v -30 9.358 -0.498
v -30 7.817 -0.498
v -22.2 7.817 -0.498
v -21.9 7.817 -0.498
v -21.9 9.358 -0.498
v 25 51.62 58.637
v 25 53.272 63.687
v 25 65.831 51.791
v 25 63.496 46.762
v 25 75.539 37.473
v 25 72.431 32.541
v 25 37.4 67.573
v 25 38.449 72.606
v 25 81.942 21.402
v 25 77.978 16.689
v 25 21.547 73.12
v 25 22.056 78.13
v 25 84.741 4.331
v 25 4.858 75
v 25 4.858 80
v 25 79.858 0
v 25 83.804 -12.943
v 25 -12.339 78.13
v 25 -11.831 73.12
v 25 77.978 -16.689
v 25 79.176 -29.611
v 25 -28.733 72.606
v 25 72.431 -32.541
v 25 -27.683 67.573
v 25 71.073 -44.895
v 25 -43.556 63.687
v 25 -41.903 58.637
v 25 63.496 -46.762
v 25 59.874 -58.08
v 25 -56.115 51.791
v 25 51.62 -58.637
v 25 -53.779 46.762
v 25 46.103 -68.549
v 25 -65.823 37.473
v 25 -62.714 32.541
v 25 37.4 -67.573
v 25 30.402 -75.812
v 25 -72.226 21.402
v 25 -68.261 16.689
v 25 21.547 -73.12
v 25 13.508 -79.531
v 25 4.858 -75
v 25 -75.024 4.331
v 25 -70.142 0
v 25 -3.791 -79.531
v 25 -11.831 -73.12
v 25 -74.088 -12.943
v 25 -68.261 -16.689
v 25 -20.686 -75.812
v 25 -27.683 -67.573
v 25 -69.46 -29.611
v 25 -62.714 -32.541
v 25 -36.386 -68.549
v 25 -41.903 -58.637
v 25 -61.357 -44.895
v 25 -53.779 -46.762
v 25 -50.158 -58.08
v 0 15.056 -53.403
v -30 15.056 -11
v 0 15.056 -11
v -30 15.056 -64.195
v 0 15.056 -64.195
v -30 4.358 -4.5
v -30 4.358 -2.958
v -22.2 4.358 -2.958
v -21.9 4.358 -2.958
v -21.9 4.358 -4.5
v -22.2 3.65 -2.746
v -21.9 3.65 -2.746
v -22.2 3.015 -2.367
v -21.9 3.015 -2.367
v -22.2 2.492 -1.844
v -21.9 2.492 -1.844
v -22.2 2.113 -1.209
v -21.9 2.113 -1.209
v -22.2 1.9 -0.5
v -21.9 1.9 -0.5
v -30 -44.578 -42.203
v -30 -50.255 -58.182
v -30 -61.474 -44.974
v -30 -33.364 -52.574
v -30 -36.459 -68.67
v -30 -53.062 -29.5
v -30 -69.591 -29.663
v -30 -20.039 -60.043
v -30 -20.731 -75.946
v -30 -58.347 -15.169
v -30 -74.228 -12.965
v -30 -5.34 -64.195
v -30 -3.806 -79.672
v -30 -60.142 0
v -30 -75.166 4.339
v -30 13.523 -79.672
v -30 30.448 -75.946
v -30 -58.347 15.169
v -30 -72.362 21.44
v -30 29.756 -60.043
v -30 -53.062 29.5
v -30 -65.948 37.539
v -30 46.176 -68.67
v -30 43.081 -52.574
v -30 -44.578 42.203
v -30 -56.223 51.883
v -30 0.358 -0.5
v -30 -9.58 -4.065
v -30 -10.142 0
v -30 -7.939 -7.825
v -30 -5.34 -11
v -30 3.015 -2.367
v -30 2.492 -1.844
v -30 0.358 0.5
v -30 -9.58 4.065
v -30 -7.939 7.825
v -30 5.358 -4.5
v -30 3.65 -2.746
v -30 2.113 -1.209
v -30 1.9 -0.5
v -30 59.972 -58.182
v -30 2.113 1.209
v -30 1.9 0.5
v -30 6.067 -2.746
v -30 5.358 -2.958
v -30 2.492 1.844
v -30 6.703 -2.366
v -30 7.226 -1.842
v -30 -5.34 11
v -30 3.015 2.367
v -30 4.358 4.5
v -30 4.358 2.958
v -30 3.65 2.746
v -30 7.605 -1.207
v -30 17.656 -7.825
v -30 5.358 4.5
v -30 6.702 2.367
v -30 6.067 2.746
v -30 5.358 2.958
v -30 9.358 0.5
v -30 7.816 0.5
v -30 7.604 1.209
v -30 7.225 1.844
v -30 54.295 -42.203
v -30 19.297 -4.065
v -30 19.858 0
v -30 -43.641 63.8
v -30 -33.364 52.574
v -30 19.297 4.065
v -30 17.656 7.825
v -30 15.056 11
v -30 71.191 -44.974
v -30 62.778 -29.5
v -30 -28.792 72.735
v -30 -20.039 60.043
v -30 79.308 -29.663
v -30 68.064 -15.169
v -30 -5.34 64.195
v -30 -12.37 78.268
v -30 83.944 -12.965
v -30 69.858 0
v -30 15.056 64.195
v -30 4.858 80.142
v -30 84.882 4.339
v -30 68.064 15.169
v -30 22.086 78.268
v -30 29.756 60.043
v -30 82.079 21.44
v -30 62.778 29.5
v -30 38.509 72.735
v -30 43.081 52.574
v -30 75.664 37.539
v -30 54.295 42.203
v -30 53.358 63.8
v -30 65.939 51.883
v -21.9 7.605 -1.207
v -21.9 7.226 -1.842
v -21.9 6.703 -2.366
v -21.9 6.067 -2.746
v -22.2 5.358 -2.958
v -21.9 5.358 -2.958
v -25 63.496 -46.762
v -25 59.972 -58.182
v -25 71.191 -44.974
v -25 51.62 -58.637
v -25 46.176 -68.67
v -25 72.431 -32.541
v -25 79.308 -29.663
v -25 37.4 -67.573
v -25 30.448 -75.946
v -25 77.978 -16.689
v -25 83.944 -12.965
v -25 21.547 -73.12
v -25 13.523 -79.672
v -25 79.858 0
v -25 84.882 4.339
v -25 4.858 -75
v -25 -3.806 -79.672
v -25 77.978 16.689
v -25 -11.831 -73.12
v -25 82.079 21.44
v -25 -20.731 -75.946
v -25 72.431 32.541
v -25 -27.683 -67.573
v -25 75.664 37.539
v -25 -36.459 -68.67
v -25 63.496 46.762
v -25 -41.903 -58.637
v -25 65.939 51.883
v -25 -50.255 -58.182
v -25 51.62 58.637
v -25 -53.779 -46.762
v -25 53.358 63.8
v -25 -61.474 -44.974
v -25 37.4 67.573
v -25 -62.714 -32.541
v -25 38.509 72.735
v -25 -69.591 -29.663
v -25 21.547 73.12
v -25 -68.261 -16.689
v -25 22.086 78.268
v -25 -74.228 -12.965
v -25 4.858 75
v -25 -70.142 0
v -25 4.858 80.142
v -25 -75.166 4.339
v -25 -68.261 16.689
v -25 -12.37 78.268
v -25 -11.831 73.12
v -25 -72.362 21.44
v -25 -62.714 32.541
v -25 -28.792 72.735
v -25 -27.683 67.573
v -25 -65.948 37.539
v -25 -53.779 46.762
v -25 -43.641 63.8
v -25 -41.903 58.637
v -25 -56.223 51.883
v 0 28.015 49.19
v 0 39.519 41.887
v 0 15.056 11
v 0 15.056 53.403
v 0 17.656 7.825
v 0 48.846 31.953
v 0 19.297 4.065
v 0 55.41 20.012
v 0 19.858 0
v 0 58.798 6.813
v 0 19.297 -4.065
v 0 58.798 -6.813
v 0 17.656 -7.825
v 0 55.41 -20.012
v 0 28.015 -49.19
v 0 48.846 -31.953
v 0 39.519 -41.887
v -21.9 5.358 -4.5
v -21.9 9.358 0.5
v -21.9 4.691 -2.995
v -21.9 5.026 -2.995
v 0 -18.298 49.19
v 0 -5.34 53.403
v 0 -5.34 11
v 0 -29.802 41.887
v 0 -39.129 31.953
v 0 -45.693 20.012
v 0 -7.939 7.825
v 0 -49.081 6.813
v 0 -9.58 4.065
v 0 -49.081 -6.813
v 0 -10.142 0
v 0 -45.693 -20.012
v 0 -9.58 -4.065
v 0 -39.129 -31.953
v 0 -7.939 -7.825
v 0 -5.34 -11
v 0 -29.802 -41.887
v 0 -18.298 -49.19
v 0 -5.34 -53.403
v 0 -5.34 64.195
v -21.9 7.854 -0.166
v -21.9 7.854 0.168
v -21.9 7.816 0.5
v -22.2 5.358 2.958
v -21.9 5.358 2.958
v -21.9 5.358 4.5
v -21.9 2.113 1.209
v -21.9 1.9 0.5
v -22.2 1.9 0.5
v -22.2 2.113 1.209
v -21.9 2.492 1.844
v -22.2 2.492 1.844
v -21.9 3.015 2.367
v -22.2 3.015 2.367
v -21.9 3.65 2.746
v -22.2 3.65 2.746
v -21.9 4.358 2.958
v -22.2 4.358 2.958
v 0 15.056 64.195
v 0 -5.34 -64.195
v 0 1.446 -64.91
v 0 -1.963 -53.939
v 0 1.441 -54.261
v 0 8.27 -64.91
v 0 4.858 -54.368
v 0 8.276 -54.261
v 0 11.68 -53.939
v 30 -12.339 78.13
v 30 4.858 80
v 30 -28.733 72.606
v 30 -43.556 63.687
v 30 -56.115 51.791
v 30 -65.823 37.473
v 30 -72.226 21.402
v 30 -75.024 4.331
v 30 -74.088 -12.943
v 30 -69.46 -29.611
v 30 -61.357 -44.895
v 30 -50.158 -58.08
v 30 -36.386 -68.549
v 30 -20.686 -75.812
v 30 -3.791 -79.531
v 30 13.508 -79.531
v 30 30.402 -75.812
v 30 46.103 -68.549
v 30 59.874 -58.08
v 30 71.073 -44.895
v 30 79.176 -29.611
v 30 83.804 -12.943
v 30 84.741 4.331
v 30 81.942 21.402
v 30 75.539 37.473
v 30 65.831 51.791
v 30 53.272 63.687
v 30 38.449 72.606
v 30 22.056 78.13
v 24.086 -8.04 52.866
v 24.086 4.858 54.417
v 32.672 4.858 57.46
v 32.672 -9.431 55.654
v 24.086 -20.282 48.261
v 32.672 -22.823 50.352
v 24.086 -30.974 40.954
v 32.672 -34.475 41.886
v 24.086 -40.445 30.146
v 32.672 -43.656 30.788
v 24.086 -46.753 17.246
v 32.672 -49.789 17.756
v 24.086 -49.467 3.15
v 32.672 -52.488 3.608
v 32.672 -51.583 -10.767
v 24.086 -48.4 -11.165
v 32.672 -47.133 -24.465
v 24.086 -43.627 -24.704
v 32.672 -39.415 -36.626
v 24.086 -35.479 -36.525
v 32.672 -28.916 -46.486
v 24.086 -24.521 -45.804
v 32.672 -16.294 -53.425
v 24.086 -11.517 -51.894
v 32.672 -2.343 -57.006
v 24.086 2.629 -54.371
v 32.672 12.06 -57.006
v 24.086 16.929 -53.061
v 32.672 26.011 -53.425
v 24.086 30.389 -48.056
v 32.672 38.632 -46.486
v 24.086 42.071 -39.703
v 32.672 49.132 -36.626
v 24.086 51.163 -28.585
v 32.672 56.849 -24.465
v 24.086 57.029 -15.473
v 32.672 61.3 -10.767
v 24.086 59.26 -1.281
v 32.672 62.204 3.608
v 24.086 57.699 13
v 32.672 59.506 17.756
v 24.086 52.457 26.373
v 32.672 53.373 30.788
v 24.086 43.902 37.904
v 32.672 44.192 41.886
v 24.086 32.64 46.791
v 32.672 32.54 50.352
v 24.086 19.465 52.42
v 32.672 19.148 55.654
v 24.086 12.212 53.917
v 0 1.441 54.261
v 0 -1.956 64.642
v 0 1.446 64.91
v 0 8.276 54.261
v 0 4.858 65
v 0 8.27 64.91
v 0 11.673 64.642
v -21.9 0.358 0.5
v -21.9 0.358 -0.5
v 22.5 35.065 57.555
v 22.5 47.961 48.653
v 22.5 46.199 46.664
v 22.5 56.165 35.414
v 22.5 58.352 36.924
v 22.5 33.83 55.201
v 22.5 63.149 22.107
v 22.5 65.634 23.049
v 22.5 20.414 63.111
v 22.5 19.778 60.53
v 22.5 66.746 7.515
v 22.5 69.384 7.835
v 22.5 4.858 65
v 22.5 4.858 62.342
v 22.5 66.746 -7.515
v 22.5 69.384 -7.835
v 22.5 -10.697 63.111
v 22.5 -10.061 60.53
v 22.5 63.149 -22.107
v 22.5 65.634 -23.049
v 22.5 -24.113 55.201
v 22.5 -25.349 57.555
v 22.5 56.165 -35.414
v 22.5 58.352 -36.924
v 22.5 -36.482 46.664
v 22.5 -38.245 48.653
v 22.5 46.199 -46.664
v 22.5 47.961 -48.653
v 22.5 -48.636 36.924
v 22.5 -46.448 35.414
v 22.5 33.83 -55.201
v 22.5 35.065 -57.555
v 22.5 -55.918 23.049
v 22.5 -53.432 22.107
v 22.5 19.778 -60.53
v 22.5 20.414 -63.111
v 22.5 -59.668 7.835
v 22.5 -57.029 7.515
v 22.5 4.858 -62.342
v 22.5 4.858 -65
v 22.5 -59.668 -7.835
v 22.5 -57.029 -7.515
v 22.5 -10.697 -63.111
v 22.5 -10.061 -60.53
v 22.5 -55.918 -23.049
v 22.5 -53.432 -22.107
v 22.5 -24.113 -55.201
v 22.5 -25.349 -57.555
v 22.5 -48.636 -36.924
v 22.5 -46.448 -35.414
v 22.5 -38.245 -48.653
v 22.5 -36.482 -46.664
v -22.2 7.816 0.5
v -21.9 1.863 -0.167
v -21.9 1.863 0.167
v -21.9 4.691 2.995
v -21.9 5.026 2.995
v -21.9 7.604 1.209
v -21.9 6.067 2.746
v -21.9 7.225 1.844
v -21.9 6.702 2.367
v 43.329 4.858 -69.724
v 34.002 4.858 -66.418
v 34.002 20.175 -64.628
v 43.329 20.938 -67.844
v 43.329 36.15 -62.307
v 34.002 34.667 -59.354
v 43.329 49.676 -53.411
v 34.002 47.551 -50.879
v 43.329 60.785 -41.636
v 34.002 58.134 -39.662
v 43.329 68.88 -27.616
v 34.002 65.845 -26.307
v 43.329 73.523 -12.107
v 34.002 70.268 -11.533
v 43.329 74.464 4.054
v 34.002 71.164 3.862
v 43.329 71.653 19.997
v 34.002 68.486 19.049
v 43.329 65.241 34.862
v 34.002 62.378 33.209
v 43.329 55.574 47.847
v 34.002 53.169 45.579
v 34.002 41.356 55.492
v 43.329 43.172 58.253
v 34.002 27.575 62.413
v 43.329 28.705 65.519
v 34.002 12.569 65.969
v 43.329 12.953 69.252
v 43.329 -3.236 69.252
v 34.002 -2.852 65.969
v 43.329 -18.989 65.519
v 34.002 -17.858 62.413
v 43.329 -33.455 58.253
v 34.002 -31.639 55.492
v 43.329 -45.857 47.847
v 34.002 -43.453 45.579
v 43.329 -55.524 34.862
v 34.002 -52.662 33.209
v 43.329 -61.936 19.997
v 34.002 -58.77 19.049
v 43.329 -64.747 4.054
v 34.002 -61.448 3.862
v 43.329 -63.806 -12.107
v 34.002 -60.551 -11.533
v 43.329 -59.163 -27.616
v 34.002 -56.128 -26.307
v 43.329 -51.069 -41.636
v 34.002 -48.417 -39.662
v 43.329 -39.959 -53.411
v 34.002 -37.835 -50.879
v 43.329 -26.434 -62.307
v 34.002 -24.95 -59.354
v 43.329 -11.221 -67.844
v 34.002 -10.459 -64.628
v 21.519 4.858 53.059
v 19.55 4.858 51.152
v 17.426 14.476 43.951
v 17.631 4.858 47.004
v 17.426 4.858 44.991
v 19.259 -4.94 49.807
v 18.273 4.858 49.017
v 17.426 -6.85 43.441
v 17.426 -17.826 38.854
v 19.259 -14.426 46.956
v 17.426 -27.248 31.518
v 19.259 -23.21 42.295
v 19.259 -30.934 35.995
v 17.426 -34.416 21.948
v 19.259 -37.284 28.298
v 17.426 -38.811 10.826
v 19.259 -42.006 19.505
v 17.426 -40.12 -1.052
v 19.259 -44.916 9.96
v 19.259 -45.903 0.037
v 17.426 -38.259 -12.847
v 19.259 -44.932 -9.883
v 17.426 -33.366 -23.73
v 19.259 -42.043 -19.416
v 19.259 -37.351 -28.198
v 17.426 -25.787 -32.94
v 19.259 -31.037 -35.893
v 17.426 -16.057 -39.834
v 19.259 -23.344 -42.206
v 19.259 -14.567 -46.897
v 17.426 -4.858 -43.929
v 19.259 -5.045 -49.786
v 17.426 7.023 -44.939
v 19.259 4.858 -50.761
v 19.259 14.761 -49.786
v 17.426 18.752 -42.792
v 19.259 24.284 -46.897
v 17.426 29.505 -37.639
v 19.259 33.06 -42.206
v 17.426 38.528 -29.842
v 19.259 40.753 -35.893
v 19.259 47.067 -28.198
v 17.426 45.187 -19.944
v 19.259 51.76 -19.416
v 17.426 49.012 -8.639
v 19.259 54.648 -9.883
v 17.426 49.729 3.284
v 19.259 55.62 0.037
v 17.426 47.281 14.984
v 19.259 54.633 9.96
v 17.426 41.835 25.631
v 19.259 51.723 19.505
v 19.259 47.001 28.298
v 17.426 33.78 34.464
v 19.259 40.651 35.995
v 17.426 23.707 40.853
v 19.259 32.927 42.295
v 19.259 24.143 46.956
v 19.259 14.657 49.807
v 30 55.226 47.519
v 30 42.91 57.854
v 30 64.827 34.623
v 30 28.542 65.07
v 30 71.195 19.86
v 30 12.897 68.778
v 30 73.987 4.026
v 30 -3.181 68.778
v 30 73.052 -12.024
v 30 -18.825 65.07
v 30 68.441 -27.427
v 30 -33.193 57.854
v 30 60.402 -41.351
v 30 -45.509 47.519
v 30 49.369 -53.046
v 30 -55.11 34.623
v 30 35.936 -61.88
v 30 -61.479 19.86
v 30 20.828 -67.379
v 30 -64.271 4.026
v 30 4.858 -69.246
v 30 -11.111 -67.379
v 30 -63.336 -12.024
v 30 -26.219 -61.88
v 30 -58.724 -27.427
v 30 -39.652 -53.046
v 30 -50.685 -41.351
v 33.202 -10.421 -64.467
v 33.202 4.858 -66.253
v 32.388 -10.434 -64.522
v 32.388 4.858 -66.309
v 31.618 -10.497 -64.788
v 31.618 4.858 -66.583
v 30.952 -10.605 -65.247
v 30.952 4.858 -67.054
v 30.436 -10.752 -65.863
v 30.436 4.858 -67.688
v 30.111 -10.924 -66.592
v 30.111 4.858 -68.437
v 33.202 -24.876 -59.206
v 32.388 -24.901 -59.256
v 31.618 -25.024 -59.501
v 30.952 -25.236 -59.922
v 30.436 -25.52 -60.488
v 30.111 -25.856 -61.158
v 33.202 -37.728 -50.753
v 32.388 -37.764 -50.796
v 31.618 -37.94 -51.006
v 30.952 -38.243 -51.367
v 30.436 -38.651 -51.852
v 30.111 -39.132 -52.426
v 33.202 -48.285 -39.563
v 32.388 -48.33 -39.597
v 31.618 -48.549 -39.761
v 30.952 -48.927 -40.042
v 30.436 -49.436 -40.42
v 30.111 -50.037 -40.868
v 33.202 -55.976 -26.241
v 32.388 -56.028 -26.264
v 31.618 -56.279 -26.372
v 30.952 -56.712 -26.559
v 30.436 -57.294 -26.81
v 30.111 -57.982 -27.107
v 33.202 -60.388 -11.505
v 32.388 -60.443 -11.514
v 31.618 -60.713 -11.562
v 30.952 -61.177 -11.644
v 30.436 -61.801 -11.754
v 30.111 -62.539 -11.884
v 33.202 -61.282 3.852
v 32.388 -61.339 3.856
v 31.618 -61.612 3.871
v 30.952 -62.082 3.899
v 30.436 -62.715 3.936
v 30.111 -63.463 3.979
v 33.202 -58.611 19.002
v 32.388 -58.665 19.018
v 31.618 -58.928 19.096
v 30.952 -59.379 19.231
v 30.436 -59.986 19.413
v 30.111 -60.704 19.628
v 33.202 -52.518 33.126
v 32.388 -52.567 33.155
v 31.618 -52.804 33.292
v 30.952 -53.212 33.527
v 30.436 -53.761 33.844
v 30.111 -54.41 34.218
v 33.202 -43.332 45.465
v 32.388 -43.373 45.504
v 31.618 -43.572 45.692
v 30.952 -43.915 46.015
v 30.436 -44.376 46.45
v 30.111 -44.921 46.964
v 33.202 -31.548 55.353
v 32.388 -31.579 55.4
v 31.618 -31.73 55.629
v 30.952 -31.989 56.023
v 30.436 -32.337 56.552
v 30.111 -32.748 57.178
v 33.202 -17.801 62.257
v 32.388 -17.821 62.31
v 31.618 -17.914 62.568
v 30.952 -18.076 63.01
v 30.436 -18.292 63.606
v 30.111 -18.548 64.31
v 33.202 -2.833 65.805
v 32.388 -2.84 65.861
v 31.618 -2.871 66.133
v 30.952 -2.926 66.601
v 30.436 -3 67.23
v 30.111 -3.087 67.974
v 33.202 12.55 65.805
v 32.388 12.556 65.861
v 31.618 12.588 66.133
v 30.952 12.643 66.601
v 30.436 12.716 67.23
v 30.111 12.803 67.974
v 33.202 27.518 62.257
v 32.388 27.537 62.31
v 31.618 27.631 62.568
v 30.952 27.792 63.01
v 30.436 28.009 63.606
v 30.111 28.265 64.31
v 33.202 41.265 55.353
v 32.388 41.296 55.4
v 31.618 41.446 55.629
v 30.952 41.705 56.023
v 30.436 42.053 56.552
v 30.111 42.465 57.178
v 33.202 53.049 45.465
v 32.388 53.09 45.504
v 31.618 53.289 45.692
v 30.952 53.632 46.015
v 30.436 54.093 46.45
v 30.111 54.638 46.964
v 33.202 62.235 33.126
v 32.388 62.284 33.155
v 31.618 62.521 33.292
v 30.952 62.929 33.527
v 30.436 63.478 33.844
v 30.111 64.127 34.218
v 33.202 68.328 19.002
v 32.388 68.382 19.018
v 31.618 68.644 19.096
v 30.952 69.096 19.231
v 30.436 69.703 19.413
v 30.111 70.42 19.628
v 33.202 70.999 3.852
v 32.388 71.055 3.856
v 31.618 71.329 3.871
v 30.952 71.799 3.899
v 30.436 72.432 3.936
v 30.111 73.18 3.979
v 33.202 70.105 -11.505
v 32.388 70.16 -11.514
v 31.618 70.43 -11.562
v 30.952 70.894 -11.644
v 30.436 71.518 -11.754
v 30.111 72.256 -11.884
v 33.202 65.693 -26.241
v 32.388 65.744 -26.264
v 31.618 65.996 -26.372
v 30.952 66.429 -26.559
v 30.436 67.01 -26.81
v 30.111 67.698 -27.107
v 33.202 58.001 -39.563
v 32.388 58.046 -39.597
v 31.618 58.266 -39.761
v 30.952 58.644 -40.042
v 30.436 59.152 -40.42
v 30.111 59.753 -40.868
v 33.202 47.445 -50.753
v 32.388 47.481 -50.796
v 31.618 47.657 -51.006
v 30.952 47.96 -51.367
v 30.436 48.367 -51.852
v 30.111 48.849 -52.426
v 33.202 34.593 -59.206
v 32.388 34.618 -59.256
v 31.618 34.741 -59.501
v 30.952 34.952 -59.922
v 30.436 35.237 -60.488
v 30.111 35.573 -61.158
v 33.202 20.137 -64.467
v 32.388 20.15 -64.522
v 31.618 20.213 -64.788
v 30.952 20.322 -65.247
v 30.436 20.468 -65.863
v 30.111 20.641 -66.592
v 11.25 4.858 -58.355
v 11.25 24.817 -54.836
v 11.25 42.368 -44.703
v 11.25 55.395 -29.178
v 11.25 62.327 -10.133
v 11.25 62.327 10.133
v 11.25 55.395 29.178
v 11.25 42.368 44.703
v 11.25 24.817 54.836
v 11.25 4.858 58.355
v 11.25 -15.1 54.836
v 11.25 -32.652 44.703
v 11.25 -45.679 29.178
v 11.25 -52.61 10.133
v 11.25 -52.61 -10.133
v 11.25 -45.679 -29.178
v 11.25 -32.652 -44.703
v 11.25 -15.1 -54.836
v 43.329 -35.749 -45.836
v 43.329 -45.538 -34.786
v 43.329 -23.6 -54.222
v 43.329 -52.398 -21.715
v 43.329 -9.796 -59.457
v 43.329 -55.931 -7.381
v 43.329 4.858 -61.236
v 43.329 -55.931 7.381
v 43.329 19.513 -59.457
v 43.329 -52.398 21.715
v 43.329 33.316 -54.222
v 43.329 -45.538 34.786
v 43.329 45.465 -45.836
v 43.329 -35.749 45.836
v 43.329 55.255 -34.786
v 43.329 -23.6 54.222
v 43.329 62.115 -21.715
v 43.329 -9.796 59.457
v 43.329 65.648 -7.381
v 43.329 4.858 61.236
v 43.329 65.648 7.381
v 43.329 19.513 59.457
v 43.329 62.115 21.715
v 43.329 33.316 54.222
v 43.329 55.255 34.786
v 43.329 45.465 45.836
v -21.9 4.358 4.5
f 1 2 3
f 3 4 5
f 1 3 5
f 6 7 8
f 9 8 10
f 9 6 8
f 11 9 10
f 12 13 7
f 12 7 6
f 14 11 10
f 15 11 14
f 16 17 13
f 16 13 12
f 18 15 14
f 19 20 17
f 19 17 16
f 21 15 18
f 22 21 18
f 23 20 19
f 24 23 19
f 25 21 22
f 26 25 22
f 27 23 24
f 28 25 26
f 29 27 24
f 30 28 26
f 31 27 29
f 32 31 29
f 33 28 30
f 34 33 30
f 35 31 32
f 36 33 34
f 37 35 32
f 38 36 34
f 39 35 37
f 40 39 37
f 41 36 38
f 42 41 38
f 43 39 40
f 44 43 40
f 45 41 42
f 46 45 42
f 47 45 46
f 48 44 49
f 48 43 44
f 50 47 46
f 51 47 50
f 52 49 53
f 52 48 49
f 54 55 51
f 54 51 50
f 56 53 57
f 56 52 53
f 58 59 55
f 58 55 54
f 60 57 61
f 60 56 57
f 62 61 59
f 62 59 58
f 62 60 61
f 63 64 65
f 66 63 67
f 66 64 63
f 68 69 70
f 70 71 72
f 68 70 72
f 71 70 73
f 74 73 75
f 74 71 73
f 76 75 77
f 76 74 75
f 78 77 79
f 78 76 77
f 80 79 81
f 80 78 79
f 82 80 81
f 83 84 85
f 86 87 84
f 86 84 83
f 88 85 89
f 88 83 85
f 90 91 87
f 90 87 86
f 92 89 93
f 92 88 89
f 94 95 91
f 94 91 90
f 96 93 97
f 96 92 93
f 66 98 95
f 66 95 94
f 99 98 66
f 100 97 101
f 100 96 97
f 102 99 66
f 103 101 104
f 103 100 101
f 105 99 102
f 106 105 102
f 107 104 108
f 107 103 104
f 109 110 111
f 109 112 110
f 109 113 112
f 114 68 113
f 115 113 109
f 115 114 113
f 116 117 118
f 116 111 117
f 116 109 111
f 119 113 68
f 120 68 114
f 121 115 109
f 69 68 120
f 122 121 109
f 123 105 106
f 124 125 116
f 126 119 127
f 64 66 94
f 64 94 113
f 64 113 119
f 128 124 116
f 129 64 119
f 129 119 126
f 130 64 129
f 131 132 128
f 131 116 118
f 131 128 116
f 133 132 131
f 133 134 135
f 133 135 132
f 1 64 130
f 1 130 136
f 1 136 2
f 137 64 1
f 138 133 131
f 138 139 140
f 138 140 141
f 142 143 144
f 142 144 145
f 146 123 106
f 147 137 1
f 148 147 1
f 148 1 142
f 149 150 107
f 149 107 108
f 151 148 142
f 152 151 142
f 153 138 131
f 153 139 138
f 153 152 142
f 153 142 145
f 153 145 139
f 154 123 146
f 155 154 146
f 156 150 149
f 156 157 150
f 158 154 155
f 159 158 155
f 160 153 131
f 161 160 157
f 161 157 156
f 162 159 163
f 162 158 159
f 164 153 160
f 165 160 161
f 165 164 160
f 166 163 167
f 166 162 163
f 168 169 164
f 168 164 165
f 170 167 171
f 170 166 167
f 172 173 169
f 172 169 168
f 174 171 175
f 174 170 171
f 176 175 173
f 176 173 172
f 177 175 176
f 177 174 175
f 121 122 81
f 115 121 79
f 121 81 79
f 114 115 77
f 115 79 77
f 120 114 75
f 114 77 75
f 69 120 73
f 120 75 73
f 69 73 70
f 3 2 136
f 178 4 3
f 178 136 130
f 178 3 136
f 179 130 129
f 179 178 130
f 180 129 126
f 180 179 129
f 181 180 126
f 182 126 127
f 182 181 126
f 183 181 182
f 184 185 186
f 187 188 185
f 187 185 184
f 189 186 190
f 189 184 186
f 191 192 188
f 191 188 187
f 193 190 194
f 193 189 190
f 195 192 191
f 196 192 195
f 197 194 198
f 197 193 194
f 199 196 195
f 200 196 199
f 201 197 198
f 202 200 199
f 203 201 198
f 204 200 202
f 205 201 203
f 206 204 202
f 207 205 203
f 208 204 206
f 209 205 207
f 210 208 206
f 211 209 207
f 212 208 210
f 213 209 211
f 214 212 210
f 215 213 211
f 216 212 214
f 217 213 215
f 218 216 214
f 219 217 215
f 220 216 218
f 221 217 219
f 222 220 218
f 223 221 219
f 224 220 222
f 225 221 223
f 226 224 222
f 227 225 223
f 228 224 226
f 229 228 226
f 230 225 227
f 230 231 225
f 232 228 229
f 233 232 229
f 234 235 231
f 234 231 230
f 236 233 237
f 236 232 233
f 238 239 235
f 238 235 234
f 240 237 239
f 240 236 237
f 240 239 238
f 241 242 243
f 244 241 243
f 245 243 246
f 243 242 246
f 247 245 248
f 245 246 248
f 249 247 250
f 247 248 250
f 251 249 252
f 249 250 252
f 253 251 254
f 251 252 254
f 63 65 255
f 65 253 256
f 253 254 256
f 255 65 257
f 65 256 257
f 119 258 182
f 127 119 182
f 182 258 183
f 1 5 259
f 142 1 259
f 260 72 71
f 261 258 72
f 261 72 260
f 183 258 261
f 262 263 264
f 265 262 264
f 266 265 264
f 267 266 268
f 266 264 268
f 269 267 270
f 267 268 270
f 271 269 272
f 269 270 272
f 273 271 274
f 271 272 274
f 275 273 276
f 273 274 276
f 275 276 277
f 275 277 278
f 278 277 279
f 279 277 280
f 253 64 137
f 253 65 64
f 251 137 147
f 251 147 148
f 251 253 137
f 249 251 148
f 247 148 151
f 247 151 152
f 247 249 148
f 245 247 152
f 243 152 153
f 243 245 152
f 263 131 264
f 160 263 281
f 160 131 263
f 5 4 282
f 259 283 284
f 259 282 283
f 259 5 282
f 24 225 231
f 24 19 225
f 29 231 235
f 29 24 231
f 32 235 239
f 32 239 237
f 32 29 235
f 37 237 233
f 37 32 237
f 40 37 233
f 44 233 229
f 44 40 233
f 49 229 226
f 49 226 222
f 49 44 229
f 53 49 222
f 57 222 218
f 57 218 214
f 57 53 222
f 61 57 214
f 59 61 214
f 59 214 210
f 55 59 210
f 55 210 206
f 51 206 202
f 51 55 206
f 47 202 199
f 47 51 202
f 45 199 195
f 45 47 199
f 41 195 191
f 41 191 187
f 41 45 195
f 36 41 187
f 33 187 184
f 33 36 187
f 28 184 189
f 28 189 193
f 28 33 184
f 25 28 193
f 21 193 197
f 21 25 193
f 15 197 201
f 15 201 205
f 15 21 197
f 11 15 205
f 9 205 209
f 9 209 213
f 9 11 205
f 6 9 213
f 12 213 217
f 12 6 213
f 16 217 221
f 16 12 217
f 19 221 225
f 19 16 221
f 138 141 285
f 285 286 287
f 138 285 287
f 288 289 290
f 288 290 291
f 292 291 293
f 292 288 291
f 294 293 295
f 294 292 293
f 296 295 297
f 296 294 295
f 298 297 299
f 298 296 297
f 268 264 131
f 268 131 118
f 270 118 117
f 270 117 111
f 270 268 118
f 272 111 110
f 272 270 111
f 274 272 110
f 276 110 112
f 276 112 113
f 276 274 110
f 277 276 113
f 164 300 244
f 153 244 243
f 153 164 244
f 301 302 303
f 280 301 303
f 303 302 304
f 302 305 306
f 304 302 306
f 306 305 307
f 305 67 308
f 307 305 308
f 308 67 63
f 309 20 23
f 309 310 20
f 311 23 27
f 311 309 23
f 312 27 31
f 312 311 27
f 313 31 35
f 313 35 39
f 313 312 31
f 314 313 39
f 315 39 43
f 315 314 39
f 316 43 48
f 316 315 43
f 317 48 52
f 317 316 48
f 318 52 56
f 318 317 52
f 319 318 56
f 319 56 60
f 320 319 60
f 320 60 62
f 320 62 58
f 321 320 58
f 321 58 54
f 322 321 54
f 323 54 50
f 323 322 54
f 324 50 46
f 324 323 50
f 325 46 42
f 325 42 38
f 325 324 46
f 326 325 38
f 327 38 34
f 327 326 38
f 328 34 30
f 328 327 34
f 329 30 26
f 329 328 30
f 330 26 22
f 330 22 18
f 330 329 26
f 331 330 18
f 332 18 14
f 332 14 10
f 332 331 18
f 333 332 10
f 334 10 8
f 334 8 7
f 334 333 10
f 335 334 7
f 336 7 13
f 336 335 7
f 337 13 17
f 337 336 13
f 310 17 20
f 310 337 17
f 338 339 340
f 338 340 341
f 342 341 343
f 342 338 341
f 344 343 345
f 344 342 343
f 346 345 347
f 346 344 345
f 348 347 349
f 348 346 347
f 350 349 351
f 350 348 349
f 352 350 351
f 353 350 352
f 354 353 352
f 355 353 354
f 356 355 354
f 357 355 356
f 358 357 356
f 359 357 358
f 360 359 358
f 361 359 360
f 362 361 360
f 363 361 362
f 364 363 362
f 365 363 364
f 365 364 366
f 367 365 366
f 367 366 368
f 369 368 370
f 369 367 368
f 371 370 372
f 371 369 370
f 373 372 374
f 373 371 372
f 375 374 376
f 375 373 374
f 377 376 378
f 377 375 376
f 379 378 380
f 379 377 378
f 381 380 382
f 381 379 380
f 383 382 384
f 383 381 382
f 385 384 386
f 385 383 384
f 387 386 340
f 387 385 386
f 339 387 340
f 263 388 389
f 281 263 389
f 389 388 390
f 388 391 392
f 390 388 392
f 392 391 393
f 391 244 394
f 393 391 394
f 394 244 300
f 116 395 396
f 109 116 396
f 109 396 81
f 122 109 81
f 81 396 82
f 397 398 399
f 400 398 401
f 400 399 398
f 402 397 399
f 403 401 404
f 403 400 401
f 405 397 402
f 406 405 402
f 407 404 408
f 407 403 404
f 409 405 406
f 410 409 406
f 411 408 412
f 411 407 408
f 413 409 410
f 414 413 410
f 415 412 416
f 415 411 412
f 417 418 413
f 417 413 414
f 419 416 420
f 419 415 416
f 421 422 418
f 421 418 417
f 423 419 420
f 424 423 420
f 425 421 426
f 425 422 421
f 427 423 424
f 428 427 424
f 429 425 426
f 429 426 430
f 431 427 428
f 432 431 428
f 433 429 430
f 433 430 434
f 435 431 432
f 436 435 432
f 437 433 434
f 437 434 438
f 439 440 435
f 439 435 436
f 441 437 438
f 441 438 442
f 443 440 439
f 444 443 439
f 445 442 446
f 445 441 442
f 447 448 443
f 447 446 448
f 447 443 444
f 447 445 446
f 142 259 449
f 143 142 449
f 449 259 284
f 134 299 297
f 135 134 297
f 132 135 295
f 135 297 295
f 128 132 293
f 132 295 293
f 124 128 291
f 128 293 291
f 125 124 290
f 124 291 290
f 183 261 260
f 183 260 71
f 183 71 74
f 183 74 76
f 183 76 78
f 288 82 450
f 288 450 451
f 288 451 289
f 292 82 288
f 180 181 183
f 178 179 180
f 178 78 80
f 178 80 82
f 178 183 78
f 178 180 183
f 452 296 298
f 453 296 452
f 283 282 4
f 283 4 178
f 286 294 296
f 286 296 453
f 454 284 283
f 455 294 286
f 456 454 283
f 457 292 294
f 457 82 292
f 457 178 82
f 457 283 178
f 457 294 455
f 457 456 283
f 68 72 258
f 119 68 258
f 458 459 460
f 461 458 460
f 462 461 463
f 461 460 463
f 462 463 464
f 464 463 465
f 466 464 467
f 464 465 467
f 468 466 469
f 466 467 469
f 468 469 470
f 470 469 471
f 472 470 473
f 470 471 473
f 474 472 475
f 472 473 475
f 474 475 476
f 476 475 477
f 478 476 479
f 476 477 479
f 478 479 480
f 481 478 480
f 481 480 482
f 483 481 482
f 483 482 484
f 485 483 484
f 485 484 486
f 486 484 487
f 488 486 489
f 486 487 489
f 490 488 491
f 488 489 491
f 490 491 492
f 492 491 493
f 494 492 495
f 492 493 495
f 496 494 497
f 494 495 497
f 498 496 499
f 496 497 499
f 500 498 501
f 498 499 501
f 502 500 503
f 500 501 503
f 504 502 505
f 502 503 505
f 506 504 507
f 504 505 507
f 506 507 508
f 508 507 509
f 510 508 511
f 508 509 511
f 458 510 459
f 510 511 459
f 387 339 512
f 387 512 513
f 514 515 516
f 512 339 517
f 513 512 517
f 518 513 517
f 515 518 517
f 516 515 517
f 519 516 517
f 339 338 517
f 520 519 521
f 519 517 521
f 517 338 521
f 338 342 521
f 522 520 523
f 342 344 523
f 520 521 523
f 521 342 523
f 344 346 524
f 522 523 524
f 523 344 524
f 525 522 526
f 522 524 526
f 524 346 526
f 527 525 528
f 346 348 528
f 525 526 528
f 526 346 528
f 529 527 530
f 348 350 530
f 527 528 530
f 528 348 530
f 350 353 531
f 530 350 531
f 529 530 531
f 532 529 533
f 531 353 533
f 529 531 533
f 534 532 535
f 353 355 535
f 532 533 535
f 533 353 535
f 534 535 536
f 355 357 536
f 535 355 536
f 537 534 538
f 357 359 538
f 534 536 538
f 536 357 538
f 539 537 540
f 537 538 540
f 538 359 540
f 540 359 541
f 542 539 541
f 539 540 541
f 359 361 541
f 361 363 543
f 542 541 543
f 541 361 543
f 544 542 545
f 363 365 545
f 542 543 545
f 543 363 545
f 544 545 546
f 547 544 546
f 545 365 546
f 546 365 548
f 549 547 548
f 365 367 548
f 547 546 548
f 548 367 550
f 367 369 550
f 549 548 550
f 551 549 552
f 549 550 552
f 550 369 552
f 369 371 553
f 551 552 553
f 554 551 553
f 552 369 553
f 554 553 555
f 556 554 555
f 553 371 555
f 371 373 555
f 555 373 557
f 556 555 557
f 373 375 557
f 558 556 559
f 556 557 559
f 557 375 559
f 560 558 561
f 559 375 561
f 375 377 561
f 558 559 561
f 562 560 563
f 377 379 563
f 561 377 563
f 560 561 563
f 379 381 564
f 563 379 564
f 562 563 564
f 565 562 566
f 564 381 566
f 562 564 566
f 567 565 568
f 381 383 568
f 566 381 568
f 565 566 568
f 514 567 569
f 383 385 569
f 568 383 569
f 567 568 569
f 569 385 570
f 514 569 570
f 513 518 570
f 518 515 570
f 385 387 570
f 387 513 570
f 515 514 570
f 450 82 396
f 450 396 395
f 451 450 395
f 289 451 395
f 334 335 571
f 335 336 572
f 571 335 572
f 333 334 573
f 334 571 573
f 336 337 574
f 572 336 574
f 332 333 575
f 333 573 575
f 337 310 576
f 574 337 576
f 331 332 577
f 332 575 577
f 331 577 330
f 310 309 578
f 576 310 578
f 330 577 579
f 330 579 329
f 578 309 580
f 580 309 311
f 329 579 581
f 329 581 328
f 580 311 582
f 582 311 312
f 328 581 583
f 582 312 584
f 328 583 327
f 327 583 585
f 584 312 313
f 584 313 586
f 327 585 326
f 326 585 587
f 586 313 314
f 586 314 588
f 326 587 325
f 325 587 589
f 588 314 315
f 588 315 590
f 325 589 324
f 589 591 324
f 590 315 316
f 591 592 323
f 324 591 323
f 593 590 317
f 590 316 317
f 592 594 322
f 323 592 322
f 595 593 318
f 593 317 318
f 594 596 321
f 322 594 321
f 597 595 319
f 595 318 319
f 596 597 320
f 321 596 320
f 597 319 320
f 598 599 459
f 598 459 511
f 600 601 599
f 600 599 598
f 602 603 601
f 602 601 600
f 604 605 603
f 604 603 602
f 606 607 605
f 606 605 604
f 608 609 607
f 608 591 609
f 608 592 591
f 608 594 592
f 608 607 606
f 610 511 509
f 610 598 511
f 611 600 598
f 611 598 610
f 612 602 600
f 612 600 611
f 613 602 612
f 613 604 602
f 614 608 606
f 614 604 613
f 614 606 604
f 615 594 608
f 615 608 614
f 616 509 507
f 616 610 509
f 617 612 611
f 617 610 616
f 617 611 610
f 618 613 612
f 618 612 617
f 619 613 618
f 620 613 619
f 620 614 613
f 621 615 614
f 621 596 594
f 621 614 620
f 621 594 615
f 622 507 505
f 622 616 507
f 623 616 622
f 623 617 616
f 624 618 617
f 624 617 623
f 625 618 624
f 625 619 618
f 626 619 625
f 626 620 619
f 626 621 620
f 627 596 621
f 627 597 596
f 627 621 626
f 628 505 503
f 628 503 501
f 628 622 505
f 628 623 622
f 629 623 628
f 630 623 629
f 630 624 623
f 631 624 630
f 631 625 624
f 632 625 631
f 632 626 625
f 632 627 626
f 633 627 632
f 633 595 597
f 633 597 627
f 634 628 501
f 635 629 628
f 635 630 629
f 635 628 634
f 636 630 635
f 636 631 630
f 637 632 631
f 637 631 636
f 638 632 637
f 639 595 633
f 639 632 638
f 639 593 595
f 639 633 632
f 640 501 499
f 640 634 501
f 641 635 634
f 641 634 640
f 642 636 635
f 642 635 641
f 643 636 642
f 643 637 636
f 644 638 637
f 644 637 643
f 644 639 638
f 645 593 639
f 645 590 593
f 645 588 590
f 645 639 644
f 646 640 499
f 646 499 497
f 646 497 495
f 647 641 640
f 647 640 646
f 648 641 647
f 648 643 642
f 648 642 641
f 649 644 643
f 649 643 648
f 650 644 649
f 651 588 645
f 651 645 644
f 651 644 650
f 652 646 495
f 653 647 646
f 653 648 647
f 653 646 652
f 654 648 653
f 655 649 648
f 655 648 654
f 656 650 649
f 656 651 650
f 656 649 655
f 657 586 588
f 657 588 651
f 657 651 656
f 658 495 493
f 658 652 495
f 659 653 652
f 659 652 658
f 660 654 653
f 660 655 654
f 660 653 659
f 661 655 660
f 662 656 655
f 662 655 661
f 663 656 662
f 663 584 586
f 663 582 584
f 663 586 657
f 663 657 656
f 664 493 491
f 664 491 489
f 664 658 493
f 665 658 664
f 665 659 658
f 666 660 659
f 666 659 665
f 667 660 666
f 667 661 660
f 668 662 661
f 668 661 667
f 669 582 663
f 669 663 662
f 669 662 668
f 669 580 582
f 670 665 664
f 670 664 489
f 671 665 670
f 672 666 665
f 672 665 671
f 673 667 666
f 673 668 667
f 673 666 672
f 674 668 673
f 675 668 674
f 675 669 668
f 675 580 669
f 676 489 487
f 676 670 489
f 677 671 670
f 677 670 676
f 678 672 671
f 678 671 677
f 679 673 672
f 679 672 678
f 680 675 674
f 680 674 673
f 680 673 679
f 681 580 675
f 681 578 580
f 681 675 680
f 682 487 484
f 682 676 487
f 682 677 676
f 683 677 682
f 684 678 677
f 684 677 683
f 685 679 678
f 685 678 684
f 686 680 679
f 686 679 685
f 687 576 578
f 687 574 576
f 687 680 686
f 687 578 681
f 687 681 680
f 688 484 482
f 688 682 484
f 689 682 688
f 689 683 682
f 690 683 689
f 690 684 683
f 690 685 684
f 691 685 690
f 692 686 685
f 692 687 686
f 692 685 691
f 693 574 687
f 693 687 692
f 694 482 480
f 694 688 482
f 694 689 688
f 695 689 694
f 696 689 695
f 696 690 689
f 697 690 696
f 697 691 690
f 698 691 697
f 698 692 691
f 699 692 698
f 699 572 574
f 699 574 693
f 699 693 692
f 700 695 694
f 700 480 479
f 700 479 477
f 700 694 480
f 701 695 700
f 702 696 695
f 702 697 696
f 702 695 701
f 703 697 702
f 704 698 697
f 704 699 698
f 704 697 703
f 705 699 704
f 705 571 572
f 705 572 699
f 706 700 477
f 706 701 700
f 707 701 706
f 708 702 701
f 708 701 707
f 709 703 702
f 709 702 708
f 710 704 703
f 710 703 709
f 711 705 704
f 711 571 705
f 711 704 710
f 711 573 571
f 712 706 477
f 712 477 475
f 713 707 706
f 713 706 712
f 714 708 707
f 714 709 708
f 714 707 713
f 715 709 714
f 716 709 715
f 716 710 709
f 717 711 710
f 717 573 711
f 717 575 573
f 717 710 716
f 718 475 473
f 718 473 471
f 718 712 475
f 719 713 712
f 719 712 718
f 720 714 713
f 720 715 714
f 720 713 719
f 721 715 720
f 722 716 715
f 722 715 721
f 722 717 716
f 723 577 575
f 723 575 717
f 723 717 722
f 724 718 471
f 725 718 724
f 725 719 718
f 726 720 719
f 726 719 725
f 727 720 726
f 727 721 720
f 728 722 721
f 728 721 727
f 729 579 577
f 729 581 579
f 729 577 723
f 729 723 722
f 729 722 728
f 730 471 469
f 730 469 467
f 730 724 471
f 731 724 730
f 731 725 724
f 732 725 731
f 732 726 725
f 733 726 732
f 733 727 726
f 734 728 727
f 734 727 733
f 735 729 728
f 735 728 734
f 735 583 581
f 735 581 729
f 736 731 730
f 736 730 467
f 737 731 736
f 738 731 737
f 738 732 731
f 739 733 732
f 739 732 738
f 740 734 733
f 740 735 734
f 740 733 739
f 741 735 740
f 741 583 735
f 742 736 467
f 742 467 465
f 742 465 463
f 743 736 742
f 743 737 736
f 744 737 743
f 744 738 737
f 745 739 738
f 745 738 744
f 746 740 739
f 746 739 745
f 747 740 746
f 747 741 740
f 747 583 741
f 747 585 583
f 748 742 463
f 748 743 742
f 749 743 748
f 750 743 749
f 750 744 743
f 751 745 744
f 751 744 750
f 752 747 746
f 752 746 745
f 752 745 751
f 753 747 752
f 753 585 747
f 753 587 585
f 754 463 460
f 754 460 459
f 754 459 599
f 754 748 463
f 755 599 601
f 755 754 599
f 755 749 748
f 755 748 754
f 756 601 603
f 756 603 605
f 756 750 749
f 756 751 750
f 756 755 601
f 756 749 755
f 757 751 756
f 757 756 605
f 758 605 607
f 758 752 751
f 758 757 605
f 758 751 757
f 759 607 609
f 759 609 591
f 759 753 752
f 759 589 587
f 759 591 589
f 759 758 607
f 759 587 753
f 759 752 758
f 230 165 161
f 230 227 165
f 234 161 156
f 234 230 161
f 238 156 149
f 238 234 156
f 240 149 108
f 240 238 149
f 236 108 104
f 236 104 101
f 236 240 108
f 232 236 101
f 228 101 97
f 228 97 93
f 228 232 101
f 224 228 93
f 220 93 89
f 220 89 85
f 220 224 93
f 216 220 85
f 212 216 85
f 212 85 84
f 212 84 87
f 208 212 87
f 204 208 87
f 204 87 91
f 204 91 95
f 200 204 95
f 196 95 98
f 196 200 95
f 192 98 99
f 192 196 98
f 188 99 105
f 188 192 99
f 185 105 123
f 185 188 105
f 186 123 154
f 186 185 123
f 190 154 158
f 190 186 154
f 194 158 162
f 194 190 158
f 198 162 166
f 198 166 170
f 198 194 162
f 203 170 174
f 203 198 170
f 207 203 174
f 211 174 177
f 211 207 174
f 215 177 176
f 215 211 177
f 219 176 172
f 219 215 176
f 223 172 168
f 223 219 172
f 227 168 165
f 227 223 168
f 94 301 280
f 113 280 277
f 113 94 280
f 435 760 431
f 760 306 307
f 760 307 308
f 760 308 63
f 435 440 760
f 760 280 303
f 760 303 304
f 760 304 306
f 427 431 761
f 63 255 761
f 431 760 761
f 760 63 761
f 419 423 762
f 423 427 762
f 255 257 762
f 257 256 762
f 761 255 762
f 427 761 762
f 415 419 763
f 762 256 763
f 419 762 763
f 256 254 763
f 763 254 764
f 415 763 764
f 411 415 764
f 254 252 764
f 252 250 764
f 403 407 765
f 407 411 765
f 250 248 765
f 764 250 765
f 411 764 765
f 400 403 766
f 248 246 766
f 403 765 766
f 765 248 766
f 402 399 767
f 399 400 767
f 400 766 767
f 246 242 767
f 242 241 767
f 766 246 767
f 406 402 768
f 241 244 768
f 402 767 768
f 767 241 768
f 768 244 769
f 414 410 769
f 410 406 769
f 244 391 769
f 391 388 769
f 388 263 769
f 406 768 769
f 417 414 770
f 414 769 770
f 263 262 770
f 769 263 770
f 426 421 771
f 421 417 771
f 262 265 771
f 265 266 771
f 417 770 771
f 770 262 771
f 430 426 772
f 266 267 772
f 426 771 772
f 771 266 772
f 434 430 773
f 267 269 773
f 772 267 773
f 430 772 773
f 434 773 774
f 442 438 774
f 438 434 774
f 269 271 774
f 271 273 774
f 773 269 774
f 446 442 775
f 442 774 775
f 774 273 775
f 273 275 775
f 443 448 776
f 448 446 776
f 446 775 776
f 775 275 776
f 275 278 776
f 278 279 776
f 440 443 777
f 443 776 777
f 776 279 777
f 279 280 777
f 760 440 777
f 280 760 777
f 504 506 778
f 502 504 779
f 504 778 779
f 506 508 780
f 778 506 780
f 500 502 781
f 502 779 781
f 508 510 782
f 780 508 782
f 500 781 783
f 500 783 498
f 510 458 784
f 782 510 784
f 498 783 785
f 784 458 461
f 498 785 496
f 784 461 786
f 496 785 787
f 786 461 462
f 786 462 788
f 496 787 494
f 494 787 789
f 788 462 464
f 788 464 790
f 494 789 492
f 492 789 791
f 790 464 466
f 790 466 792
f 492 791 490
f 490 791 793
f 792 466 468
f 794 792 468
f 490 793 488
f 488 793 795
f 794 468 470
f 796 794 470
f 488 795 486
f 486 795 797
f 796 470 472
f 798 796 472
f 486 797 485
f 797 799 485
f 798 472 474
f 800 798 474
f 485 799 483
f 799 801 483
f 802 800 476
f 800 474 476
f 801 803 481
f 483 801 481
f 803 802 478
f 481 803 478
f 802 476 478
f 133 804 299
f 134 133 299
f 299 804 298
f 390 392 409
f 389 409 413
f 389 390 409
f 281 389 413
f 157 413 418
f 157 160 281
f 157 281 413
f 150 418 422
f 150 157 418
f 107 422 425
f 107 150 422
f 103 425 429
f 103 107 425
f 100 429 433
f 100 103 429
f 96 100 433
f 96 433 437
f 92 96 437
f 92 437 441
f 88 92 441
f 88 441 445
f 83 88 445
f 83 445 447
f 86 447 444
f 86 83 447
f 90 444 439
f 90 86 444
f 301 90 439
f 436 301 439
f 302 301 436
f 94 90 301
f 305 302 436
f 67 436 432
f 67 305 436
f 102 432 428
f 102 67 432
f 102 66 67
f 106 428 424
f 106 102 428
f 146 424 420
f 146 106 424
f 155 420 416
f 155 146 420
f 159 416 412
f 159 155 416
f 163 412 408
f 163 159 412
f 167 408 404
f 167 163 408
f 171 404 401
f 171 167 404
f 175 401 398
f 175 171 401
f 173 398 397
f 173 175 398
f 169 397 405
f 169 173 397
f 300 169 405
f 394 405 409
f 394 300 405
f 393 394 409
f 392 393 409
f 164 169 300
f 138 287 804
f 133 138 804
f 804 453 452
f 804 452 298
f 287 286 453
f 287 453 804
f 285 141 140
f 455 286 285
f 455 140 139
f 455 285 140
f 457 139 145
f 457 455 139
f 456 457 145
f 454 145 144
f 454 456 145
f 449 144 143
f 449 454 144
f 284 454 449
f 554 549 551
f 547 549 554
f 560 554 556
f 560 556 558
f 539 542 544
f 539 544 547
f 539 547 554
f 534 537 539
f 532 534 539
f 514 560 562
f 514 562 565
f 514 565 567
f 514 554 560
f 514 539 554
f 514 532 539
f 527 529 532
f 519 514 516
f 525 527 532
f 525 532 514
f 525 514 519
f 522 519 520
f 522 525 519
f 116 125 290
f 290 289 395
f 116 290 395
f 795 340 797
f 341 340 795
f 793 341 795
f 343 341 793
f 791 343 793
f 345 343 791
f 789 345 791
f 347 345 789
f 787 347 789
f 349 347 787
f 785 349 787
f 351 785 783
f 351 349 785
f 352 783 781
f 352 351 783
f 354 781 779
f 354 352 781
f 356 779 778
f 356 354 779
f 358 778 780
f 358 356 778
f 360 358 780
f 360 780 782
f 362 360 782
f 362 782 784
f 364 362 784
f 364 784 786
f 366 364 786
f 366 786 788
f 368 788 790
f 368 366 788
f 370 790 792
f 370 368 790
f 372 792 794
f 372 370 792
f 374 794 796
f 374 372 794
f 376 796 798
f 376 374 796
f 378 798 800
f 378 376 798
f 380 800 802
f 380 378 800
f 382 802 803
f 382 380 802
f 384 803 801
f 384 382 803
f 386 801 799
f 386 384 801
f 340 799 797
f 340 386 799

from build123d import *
from build123d.topology import SkipClean

# Parameters (mm, degrees)
ESBO_O2_R                = 15
RESSALTO_EXTRUS_O1_DEPTH = 30
FILETE1_R                = 10
FILETE5_R                = 3
RESSALTO_EXTRUS_O3_DEPTH = 30
RESSALTO_EXTRUS_O4_START = -30
ESBO_O9_R                = 3
RESSALTO_EXTRUS_O4_DEPTH = 30
ESBO_O10_R               = 3
RESSALTO_EXTRUS_O5_DEPTH = 2
CORTE_EXTRUS_O1_START    = -0.3
ESBO_O14_R               = 3
CORTE_EXTRUS_O1_DEPTH    = 0.3
RESSALTO_EXTRUS_O6_START = -27
RESSALTO_EXTRUS_O6_DEPTH = 27


with BuildPart() as part:
    # Esboço1 → Revolução2 (revolve)
    with BuildSketch(Plane.XY, mode=Mode.PRIVATE) as revolu_o2_sk:
        Polygon((30, 69.858349347), (30, 4.858349347), (0, 4.858349347), (0, 19.858349347), (22.5, 19.858349347), (22.5, 69.858349347), (-30, 69.858349347), (-30, 85), (-25, 85), (-25, 79.858349347), (25, 79.858349347), (25, 84.858349347), (30, 84.858349347), align=None)
    revolve(revolu_o2_sk.sketch.rotate(Axis((-56.599013794, 4.858349347, 0), (1, 0, 0)), 90), axis=Axis((-56.599013794, 4.858349347, 0), (1, 0, 0)))

    # Esboço2 → Ressalto-extrusão1 (add)
    with BuildSketch(Plane(origin=(0, 0, 0), x_dir=(0, 0, -1), z_dir=(1, 0, 0))):
        with Locations(Location((0, 4.858349347, 0), (0, 0, 180))):
            Circle(ESBO_O2_R)
        with BuildLine():
            Line((-2.958039892, 5.358349347), (-4.5, 5.358349347))
            Line((-4.5, 5.358349347), (-4.5, 4.358349347))
            Line((-4.5, 4.358349347), (-2.958039892, 4.358349347))
            ThreePointArc((-2.958039892, 4.358349347), (-2.121320344, 2.737029004), (-0.5, 1.900309456))
            Line((-0.5, 1.900309456), (-0.5, 0.358349347))
            Line((-0.5, 0.358349347), (0.5, 0.358349347))
            Line((0.5, 0.358349347), (0.5, 1.900309456))
            ThreePointArc((0.5, 1.900309456), (2.121320344, 2.737029004), (2.958039892, 4.358349347))
            Line((2.958039892, 4.358349347), (4.5, 4.358349347))
            Line((4.5, 4.358349347), (4.5, 5.358349347))
            Line((4.5, 5.358349347), (2.958039892, 5.358349347))
            ThreePointArc((2.958039892, 5.358349347), (2.120440089, 6.98054958), (0.497545425, 7.81680309))
            Line((0.497545425, 7.81680309), (0.497545425, 9.358349347))
            Line((0.497545425, 9.358349347), (-0.5, 9.358349347))
            Line((-0.5, 9.358349347), (-0.5, 7.816389239))
            ThreePointArc((-0.5, 7.816389239), (-2.121320344, 6.979669691), (-2.958039892, 5.358349347))
        make_face(mode=Mode.SUBTRACT)
    extrude(amount=-RESSALTO_EXTRUS_O1_DEPTH)

    # Esboço4 → Revolução3 (revolve)
    with BuildSketch(Plane.XY, mode=Mode.PRIVATE) as revolu_o3_sk:
        Polygon((0, 59.226522002), (0, 4.858349347), (43.32899264, 4.858349347), (43.32899264, 74.582067629), align=None)
    revolve(revolu_o3_sk.sketch.rotate(Axis((-90.113441675, 4.858349347, 0), (1, 0, 0)), 270), axis=Axis((-90.113441675, 4.858349347, 0), (1, 0, 0)))

    # Esboço5 → Corte-Revolução3 (revolve, cut)
    with BuildSketch(Plane.XY, mode=Mode.PRIVATE) as corte_revolu_o3_sk:
        Polygon((43.32899264, 4.858349347), (43.32899264, 66.094541607), (32.672301871, 62.317871729), (22.015611102, 58.541201852), (17.426446921, 56.914828477), (17.426446921, 4.858349347), align=None)
    revolve(corte_revolu_o3_sk.sketch.rotate(Axis((17.426446921, 4.858349347, 0), (1, 0, 0)), 90), axis=Axis((17.426446921, 4.858349347, 0), (1, 0, 0)), mode=Mode.SUBTRACT)

    # Filete1
    filete1_edges = [part.edges().sort_by_distance(p)[0] for p in [
        (17.426446921, 4.858349347, -52.05647913),
    ]]
    fillet(filete1_edges, radius=FILETE1_R)

    # Filete5
    filete5_edges = [part.edges().sort_by_distance(p)[0] for p in [
        (30, 4.858349347, 65),
    ]]
    fillet(filete5_edges, radius=FILETE5_R)

    # Esboço7 → Ressalto-extrusão3 (add)
    with BuildSketch(Plane.ZY.offset(30)):
        with BuildLine():
            Line((-11, 15.056388374), (-64.195015383, 15.056388374))
            ThreePointArc((-64.195015383, 15.056388374), (-65, 4.858349347), (-64.195015383, -5.33968968))
            Line((-64.195015383, -5.33968968), (-11, -5.33968968))
            ThreePointArc((-11, -5.33968968), (-15, 4.858349347), (-11, 15.056388374))
        make_face()
        with BuildLine():
            Line((11, -5.33968968), (64.195015383, -5.33968968))
            ThreePointArc((64.195015383, -5.33968968), (65, 4.858349347), (64.195015383, 15.056388374))
            Line((64.195015383, 15.056388374), (11, 15.056388374))
            ThreePointArc((11, 15.056388374), (15, 4.858349347), (11, -5.33968968))
        make_face()
    extrude(amount=-RESSALTO_EXTRUS_O3_DEPTH)

    # Esboço9 → Ressalto-extrusão4 (add)
    with BuildSketch(Plane.ZY.offset(20.2).offset(RESSALTO_EXTRUS_O4_START)):
        with Locations((0, 4.858349347)):
            Circle(ESBO_O9_R)
    extrude(amount=RESSALTO_EXTRUS_O4_DEPTH)

    # Esboço10 → Ressalto-extrusão5 (add)
    with BuildSketch(Plane.ZY.offset(20.2)):
        with Locations((0, 4.858349347)):
            Circle(ESBO_O10_R)
    extrude(amount=RESSALTO_EXTRUS_O5_DEPTH)

    # Esboço14 → Corte-extrusão1 (cut)
    with SkipClean():  # the faces are left unmerged after this step: merging them gives an invalid solid
        with BuildSketch(Plane.ZY.offset(22.2).offset(CORTE_EXTRUS_O1_START)):
            with Locations((0, 4.858349347)):
                Circle(ESBO_O14_R)
        extrude(amount=CORTE_EXTRUS_O1_DEPTH, mode=Mode.SUBTRACT)
    add(part.part.scale(1), mode=Mode.REPLACE)  # the faces are merged on a copy

    # Esboço15 → Ressalto-extrusão6 (add)
    with SkipClean():  # the faces are left unmerged after this step: merging them gives an invalid solid
        with BuildSketch(Plane.ZY.offset(21.9).offset(RESSALTO_EXTRUS_O6_START)):
            with BuildLine():
                Line((-2.958039892, 5.358349347), (-4.5, 5.358349347))
                Line((-4.5, 5.358349347), (-4.5, 4.358349347))
                Line((-4.5, 4.358349347), (-2.958039892, 4.358349347))
                ThreePointArc((-2.958039892, 4.358349347), (-3, 4.858349347), (-2.958039892, 5.358349347))
            make_face()
            with BuildLine():
                Line((0.5, 7.816389239), (0.5, 9.358349347))
                Line((0.5, 9.358349347), (-0.497545425, 9.358349347))
                Line((-0.497545425, 9.358349347), (-0.497545425, 7.81680309))
                ThreePointArc((-0.497545425, 7.81680309), (0.00124461, 7.858349089), (0.5, 7.816389239))
            make_face()
            with BuildLine():
                Line((2.958039892, 4.358349347), (4.5, 4.358349347))
                Line((4.5, 4.358349347), (4.5, 5.358349347))
                Line((4.5, 5.358349347), (2.958039892, 5.358349347))
                ThreePointArc((2.958039892, 5.358349347), (3, 4.858349347), (2.958039892, 4.358349347))
            make_face()
            with BuildLine():
                ThreePointArc((2.958039892, 4.358349347), (3, 4.858349347), (2.958039892, 5.358349347))
                ThreePointArc((2.958039892, 5.358349347), (2.121320344, 6.979669691), (0.5, 7.816389239))
                ThreePointArc((0.5, 7.816389239), (0.00124461, 7.858349089), (-0.497545425, 7.81680309))
                ThreePointArc((-0.497545425, 7.81680309), (-2.120440089, 6.98054958), (-2.958039892, 5.358349347))
                ThreePointArc((-2.958039892, 5.358349347), (-3, 4.858349347), (-2.958039892, 4.358349347))
                ThreePointArc((-2.958039892, 4.358349347), (-2.121320344, 2.737029004), (-0.5, 1.900309456))
                ThreePointArc((-0.5, 1.900309456), (0, 1.858349347), (0.5, 1.900309456))
                ThreePointArc((0.5, 1.900309456), (2.121320344, 2.737029004), (2.958039892, 4.358349347))
            make_face()
            with BuildLine():
                Line((-0.5, 1.900309456), (-0.5, 0.358349347))
                Line((-0.5, 0.358349347), (0.5, 0.358349347))
                Line((0.5, 0.358349347), (0.5, 1.900309456))
                ThreePointArc((0.5, 1.900309456), (0, 1.858349347), (-0.5, 1.900309456))
            make_face()
        extrude(amount=RESSALTO_EXTRUS_O6_DEPTH)


solid = part.part
